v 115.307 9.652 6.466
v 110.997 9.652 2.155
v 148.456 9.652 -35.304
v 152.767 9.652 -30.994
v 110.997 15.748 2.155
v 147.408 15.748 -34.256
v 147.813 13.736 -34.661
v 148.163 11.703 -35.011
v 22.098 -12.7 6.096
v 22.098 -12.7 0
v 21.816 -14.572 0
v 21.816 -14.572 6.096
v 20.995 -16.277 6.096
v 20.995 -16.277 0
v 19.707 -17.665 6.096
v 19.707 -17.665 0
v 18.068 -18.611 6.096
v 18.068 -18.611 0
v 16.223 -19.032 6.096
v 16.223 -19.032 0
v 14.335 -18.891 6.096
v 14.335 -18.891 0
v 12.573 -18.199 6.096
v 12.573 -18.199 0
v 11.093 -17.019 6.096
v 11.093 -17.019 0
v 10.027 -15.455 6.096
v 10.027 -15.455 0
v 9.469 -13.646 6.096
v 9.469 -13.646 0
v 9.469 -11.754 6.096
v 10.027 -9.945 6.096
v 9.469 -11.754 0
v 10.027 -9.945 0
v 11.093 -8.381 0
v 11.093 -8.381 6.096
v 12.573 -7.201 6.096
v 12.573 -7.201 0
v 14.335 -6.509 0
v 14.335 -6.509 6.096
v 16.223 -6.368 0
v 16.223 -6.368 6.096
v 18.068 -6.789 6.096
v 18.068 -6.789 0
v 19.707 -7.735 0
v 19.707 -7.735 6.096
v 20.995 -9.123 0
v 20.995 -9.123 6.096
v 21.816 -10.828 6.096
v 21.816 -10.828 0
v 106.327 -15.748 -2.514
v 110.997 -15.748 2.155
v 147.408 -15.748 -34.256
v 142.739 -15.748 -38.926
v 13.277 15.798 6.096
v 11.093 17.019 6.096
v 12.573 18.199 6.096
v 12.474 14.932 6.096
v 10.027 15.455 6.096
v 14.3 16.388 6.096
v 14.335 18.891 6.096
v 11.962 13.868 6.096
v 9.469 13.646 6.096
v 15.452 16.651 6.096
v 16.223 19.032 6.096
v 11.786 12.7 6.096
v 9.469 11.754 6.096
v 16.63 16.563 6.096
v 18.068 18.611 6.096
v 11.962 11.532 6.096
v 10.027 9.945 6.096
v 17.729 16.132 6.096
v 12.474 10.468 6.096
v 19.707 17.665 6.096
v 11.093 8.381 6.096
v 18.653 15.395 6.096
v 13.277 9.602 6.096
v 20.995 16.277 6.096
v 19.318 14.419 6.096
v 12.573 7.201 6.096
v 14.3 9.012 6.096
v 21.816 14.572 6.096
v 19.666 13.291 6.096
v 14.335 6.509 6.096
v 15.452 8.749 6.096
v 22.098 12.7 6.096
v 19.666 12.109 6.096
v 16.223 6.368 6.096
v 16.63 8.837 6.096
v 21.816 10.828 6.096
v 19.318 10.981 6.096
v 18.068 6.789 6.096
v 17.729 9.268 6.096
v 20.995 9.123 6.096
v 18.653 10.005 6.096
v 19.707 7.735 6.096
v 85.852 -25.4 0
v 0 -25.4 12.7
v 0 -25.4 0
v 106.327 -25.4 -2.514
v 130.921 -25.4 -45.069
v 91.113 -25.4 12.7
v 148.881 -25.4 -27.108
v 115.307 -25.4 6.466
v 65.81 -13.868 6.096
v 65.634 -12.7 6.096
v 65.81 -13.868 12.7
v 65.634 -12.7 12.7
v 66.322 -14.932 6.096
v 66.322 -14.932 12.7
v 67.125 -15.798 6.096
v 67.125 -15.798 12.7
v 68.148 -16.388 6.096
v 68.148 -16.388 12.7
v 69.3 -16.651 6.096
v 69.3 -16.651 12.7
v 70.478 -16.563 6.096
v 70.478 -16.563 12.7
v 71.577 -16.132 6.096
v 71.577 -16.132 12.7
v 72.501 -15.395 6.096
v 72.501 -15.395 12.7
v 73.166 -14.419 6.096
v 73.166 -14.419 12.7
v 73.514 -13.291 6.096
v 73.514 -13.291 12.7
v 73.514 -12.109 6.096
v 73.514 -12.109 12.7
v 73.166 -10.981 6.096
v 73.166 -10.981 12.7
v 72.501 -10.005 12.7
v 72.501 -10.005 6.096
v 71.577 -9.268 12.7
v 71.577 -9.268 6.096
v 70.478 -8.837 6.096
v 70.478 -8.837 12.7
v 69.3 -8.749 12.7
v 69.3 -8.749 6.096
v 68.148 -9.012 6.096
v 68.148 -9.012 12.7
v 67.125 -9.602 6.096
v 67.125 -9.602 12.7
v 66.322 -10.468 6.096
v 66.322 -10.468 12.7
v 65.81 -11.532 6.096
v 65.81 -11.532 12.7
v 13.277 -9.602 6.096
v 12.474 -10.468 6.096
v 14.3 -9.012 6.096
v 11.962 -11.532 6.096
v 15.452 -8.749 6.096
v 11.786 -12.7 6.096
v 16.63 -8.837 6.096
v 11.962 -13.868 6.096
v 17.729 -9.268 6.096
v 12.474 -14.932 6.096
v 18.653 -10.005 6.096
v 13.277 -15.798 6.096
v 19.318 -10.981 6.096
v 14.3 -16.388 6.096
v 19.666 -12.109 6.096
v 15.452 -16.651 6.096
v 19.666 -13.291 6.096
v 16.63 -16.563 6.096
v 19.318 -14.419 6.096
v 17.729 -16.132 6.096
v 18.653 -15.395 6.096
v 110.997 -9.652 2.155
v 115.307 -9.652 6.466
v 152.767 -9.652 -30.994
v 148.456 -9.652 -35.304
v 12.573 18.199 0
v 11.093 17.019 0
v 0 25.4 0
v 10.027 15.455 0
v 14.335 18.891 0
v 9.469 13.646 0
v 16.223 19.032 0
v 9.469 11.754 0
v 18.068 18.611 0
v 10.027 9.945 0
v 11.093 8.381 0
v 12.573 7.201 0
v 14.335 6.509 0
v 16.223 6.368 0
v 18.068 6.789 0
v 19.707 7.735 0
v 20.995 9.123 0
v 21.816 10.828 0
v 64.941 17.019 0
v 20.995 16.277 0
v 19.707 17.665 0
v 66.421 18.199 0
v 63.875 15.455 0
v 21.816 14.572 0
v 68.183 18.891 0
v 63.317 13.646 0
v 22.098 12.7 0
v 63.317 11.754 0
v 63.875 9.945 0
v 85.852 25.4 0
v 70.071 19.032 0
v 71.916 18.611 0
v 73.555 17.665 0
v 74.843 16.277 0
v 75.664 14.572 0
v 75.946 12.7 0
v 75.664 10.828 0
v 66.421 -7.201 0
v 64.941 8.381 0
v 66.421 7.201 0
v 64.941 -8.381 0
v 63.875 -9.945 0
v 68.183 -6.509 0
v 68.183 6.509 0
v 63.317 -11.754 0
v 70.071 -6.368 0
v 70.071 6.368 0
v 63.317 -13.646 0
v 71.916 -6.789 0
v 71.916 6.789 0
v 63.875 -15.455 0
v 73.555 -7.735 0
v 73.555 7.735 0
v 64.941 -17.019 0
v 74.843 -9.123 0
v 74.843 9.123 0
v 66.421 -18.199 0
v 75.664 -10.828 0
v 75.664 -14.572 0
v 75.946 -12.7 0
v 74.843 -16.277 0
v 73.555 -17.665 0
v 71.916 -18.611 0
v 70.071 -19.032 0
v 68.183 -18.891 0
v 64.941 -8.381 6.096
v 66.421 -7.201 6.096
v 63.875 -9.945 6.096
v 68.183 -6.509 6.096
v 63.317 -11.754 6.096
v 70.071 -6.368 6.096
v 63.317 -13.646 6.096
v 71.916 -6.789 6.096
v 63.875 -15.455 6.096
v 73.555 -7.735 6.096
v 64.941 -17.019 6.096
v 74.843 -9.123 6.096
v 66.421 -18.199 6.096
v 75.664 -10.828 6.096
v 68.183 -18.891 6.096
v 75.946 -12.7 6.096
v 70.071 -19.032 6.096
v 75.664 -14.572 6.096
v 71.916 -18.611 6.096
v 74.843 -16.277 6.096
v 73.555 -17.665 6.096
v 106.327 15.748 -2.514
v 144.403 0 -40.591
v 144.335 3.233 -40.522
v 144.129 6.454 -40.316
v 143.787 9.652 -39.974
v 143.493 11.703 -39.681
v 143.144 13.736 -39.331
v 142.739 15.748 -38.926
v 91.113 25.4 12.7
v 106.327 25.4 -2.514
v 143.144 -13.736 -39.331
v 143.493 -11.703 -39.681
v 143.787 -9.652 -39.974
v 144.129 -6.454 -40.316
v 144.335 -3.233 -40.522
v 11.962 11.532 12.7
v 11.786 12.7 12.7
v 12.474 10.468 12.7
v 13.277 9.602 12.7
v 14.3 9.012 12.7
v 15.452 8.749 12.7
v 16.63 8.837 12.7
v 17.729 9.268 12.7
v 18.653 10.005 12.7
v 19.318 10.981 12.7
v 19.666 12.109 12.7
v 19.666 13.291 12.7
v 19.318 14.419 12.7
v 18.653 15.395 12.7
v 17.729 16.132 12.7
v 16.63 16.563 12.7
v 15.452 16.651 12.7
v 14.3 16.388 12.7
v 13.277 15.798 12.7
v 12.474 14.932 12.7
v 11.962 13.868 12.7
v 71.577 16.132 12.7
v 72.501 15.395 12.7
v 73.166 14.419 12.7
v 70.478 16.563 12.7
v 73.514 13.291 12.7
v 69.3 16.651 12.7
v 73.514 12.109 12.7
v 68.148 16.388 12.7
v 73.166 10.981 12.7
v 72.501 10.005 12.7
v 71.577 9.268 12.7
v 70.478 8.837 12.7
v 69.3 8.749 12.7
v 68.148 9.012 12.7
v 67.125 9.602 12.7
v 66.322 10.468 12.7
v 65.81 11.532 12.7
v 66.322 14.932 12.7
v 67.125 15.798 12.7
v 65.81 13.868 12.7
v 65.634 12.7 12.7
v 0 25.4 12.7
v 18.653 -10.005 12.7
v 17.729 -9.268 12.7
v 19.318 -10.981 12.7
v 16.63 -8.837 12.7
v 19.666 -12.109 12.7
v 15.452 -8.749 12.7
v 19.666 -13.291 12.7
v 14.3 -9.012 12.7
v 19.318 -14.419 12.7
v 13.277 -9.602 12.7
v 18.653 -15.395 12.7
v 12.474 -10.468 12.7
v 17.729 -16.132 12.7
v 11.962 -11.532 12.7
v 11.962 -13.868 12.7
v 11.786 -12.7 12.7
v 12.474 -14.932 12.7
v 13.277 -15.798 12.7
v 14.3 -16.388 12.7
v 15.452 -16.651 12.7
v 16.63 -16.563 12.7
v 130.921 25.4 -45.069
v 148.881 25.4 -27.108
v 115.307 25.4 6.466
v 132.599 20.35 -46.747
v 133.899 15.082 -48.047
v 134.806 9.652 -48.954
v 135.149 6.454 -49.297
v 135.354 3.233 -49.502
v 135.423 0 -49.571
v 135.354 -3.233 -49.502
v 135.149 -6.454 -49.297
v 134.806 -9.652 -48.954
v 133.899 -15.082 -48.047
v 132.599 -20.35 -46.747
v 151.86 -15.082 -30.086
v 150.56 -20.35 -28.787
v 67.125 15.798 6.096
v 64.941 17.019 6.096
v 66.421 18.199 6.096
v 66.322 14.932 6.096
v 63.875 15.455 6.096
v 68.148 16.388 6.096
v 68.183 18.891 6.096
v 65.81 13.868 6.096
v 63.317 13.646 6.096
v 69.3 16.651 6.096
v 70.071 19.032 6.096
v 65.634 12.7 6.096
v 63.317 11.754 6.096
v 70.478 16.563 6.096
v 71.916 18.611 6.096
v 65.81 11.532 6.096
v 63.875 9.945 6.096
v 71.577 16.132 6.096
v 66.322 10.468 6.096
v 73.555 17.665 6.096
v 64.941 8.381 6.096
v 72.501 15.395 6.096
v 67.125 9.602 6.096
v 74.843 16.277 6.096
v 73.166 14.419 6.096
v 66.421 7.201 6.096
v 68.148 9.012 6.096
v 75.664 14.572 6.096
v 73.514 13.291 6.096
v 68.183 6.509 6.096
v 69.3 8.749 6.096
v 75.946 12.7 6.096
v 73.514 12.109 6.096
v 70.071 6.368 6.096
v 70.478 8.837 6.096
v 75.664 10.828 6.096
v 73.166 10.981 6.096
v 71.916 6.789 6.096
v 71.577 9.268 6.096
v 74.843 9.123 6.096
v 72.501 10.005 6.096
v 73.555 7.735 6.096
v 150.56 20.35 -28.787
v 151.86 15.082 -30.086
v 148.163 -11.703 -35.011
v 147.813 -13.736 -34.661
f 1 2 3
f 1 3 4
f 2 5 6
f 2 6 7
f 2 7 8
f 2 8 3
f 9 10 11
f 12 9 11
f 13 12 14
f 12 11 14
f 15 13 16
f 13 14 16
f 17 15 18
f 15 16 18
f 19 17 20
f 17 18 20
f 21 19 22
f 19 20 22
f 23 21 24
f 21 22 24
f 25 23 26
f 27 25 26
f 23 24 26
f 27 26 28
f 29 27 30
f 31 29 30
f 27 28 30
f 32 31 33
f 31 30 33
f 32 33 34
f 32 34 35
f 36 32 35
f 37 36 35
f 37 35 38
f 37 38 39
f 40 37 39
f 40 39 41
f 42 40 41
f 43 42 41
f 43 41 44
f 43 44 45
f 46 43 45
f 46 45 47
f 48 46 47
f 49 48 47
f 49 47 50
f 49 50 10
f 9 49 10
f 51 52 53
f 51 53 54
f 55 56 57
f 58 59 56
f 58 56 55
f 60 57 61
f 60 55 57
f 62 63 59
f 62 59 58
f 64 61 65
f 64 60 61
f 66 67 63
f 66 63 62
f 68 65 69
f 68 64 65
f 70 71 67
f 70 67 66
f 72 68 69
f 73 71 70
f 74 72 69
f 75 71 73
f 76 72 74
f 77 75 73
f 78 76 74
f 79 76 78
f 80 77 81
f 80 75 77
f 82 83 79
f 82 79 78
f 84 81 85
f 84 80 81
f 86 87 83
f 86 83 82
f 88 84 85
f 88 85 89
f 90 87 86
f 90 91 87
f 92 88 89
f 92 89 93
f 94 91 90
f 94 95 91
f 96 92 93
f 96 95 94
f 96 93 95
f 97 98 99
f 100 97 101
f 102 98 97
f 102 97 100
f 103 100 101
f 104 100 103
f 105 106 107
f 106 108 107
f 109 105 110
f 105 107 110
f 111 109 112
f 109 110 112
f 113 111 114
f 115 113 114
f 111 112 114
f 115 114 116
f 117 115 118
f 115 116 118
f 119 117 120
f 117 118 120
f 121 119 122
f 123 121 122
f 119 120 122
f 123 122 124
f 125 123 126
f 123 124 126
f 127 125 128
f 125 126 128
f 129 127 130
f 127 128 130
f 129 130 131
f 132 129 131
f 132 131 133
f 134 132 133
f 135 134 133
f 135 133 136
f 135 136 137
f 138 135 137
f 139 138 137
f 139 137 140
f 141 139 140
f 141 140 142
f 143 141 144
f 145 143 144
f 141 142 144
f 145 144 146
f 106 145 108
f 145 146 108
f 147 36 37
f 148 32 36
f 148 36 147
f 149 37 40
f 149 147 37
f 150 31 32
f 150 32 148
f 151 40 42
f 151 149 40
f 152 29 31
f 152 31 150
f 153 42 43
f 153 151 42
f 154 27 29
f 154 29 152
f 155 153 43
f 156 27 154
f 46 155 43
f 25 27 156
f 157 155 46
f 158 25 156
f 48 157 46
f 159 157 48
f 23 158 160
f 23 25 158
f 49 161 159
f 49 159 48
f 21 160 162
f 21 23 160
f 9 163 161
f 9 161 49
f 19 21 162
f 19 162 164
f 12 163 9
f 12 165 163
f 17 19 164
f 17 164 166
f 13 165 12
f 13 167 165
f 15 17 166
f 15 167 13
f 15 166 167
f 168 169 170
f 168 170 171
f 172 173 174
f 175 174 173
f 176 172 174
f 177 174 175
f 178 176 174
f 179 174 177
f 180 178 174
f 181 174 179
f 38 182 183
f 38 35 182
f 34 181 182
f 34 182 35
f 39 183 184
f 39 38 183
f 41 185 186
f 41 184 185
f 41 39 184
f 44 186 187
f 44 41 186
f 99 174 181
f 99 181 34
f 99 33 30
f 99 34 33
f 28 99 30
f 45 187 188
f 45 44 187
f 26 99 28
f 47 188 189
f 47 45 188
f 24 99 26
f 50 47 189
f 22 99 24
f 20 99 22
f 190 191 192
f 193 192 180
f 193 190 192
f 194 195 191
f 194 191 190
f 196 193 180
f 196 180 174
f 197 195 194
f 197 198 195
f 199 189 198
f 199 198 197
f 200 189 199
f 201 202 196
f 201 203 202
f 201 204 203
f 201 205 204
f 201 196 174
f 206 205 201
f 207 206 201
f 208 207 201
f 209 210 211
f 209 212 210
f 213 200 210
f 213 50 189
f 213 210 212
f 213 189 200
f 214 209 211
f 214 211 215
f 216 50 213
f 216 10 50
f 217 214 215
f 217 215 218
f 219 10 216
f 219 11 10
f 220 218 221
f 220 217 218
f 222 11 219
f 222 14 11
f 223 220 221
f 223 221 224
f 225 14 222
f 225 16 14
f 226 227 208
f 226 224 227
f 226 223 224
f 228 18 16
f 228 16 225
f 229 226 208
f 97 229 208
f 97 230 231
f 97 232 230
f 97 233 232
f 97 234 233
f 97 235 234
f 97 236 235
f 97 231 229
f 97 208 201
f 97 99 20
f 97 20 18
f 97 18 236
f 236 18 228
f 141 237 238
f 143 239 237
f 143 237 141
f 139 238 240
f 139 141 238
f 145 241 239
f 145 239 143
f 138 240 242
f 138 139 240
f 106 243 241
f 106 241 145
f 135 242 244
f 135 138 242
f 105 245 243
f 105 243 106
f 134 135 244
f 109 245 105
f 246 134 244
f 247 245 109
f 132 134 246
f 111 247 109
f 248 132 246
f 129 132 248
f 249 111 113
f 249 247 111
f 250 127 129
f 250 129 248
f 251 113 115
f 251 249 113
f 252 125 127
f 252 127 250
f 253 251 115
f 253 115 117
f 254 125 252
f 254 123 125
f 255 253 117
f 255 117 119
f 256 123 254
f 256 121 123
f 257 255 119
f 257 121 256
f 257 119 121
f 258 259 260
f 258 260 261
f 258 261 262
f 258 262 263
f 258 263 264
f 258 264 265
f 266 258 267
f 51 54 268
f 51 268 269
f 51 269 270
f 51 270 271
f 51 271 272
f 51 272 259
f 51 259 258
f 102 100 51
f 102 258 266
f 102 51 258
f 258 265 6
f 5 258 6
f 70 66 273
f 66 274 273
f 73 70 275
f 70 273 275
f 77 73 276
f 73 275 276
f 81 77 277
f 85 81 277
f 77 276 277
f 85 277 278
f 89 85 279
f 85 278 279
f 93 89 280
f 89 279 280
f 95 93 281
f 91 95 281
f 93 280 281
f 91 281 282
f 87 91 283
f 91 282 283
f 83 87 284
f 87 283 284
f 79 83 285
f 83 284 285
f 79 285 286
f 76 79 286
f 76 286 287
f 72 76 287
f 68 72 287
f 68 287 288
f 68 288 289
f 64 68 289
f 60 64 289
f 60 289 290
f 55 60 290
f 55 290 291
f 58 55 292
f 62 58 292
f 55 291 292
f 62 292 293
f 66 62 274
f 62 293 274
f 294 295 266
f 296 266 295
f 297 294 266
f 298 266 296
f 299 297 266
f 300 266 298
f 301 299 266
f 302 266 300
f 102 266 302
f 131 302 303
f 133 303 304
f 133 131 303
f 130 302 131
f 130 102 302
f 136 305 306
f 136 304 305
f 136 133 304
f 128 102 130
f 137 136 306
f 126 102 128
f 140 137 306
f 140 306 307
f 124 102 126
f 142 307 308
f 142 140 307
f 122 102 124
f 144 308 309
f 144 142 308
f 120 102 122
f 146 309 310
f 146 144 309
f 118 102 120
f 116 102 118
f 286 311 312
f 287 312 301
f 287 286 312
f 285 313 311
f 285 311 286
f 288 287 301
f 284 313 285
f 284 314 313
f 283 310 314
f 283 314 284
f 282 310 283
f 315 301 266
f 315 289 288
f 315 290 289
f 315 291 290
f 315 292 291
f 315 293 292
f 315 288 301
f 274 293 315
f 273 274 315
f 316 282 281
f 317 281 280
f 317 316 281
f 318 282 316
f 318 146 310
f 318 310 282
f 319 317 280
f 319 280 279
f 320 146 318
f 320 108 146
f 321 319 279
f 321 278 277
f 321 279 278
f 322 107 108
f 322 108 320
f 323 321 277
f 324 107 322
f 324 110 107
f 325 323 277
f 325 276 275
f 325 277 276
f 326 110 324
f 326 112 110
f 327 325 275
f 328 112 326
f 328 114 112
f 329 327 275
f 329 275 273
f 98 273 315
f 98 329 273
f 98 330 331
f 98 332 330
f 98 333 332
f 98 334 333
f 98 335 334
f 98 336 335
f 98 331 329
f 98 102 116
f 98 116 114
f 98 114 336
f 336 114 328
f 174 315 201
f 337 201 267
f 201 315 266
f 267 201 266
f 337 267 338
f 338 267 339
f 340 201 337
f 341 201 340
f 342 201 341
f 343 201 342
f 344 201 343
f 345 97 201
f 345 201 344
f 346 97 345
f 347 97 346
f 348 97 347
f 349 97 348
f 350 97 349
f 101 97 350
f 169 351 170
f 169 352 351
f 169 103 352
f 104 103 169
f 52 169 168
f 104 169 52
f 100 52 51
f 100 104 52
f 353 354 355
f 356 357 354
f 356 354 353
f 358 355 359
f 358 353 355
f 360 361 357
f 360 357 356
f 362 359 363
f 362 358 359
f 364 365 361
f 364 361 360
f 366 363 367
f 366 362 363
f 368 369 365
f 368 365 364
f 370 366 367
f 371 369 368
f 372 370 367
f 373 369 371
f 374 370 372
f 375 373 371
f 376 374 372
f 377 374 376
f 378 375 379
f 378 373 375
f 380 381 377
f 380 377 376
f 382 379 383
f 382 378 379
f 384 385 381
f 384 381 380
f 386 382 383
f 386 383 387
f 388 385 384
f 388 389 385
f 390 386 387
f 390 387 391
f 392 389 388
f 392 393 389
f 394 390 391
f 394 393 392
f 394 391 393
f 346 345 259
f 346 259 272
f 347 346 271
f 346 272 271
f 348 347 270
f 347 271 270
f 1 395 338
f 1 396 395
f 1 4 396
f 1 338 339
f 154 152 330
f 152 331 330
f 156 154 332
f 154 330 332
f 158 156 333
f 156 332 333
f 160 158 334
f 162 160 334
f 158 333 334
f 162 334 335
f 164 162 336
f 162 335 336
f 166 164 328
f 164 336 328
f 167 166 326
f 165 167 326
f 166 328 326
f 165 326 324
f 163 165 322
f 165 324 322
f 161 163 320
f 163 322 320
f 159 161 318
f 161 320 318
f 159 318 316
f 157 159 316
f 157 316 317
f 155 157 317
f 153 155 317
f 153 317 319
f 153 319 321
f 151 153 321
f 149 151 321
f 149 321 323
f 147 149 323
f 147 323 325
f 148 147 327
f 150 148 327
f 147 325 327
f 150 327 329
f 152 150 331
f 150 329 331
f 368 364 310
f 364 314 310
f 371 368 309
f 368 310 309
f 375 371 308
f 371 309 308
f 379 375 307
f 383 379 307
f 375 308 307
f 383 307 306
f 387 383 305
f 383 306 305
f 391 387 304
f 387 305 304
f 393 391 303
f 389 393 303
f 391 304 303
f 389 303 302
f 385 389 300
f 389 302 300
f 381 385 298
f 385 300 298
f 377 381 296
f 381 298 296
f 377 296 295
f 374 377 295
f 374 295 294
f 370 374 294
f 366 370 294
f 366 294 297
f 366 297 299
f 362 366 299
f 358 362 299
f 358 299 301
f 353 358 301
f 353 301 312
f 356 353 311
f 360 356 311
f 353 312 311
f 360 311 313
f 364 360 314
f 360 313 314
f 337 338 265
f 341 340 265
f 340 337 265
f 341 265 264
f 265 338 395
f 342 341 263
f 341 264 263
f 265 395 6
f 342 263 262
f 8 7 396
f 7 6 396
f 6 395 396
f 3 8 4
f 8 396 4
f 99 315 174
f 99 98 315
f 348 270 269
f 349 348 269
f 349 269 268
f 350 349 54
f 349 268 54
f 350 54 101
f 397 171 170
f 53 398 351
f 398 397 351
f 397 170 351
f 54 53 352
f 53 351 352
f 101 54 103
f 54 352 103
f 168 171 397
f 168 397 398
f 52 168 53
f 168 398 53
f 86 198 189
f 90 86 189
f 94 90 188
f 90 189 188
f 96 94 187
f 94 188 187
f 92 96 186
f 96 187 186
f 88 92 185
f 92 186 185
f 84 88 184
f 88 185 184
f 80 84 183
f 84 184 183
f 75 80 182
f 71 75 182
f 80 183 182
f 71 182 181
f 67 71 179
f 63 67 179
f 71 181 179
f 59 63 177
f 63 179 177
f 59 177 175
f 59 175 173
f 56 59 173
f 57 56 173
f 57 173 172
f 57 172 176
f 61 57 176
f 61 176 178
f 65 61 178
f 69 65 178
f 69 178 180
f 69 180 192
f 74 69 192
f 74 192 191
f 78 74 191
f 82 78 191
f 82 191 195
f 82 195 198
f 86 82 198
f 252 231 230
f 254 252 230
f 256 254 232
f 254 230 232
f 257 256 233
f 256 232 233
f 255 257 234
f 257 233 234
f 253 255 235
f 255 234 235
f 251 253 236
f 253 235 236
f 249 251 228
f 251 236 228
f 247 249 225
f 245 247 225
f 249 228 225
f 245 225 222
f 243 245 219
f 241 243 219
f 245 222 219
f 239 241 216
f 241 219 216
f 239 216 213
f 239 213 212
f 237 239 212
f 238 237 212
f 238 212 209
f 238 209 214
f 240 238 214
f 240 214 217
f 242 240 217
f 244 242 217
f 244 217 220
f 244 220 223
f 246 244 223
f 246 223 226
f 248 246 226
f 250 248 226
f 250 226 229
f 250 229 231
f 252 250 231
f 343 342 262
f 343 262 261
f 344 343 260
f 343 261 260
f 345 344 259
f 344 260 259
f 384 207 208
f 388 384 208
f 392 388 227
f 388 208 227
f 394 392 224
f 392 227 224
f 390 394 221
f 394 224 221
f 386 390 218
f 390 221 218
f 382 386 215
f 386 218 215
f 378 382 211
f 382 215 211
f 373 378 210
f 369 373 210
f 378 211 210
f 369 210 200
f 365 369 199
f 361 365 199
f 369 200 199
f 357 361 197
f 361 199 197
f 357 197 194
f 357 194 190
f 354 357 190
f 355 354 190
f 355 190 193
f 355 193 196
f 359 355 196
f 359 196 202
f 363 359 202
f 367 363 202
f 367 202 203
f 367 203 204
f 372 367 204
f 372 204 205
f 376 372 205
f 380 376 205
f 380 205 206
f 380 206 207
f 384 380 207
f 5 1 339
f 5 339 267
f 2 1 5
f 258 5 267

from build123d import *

# Parameters (mm, degrees)
F1_DEPTH       = 25.4
F4_D           = 7.9248
F4_CBORE_D     = 12.7
F4_CBORE_DEPTH = 6.096
F6_DEPTH       = 139.7917874995
F8_DEPTH       = 121.1595313784


with BuildPart() as f1:
    # F0 (on Front) → F1 (new body, symmetric)
    with BuildSketch(Plane.XZ):
        Polygon((0, 12.7), (0, 0), (85.852, 0), (135.4230137883, -49.5710137883), (153.3835260304, -31.6105015462), (115.3072400771, 6.4657844072), (106.326983956, -2.5144717139), (91.1125122421, 12.7), align=None)
    extrude(amount=F1_DEPTH, both=True)

    # F4 (through all)
    with Locations(Plane(origin=(0, 0, 0), x_dir=(1, 0, 0), z_dir=(0, 0, -1))):
        with Locations((15.748, 12.7), (15.748, -12.7), (69.596, 12.7), (69.596, -12.7)):
            CounterBoreHole(F4_D / 2, F4_CBORE_D / 2, F4_CBORE_DEPTH)

    # F5 (on face) → F6 (cut, through all)
    with BuildSketch(Plane(origin=(92.4970137883, 0, -92.4970137883), x_dir=(0, 1, 0), z_dir=(0.7071067812, 0, -0.7071067812))):
        Polygon((9.652, 86.1065313784), (-9.652, 86.1065313784), (-9.652, 80.0105313784), (-15.748, 80.0105313784), (-15.748, 73.4065313784), (15.748, 73.4065313784), (15.748, 80.0105313784), (9.652, 80.0105313784), align=None)
    extrude(amount=-F6_DEPTH, mode=Mode.SUBTRACT)

    # F7 (on face) → F8 (cut, through all)
    with BuildSketch(Plane(origin=(60.8865122421, 0, 60.8865122421), x_dir=(0.7071067812, 0, -0.7071067812), z_dir=(0.7071067812, 0, 0.7071067812))):
        with BuildLine():
            ThreePointArc((129.9384315595, -9.652), (127.8044235189, -17.7400424907), (124.4435497331, -25.4))
            Line((124.4435497331, -25.4), (130.8105313784, -25.4))
            Line((130.8105313784, -25.4), (130.8105313784, -15.748))
            Line((130.8105313784, -15.748), (130.8105313784, -9.652))
            Line((130.8105313784, -9.652), (129.9384315595, -9.652))
        make_face()
        with BuildLine():
            Line((129.9384315595, 9.652), (130.8105313784, 9.652))
            Line((130.8105313784, 9.652), (130.8105313784, 15.748))
            Line((130.8105313784, 15.748), (130.8105313784, 25.4))
            Line((130.8105313784, 25.4), (124.4435497331, 25.4))
            ThreePointArc((124.4435497331, 25.4), (127.8044235189, 17.7400424907), (129.9384315595, 9.652))
        make_face()
        with BuildLine():
            ThreePointArc((130.8105313784, 0), (130.5920632473, -4.8456594519), (129.9384315595, -9.652))
            Line((129.9384315595, -9.652), (130.8105313784, -9.652))
            Line((130.8105313784, -9.652), (130.8105313784, 0))
        make_face()
        with BuildLine():
            ThreePointArc((129.9384315595, 9.652), (130.5920632473, 4.8456594519), (130.8105313784, 0))
            Line((130.8105313784, 0), (130.8105313784, 9.652))
            Line((130.8105313784, 9.652), (129.9384315595, 9.652))
        make_face()
    extrude(amount=-F8_DEPTH, mode=Mode.SUBTRACT)


solid = f1.part
